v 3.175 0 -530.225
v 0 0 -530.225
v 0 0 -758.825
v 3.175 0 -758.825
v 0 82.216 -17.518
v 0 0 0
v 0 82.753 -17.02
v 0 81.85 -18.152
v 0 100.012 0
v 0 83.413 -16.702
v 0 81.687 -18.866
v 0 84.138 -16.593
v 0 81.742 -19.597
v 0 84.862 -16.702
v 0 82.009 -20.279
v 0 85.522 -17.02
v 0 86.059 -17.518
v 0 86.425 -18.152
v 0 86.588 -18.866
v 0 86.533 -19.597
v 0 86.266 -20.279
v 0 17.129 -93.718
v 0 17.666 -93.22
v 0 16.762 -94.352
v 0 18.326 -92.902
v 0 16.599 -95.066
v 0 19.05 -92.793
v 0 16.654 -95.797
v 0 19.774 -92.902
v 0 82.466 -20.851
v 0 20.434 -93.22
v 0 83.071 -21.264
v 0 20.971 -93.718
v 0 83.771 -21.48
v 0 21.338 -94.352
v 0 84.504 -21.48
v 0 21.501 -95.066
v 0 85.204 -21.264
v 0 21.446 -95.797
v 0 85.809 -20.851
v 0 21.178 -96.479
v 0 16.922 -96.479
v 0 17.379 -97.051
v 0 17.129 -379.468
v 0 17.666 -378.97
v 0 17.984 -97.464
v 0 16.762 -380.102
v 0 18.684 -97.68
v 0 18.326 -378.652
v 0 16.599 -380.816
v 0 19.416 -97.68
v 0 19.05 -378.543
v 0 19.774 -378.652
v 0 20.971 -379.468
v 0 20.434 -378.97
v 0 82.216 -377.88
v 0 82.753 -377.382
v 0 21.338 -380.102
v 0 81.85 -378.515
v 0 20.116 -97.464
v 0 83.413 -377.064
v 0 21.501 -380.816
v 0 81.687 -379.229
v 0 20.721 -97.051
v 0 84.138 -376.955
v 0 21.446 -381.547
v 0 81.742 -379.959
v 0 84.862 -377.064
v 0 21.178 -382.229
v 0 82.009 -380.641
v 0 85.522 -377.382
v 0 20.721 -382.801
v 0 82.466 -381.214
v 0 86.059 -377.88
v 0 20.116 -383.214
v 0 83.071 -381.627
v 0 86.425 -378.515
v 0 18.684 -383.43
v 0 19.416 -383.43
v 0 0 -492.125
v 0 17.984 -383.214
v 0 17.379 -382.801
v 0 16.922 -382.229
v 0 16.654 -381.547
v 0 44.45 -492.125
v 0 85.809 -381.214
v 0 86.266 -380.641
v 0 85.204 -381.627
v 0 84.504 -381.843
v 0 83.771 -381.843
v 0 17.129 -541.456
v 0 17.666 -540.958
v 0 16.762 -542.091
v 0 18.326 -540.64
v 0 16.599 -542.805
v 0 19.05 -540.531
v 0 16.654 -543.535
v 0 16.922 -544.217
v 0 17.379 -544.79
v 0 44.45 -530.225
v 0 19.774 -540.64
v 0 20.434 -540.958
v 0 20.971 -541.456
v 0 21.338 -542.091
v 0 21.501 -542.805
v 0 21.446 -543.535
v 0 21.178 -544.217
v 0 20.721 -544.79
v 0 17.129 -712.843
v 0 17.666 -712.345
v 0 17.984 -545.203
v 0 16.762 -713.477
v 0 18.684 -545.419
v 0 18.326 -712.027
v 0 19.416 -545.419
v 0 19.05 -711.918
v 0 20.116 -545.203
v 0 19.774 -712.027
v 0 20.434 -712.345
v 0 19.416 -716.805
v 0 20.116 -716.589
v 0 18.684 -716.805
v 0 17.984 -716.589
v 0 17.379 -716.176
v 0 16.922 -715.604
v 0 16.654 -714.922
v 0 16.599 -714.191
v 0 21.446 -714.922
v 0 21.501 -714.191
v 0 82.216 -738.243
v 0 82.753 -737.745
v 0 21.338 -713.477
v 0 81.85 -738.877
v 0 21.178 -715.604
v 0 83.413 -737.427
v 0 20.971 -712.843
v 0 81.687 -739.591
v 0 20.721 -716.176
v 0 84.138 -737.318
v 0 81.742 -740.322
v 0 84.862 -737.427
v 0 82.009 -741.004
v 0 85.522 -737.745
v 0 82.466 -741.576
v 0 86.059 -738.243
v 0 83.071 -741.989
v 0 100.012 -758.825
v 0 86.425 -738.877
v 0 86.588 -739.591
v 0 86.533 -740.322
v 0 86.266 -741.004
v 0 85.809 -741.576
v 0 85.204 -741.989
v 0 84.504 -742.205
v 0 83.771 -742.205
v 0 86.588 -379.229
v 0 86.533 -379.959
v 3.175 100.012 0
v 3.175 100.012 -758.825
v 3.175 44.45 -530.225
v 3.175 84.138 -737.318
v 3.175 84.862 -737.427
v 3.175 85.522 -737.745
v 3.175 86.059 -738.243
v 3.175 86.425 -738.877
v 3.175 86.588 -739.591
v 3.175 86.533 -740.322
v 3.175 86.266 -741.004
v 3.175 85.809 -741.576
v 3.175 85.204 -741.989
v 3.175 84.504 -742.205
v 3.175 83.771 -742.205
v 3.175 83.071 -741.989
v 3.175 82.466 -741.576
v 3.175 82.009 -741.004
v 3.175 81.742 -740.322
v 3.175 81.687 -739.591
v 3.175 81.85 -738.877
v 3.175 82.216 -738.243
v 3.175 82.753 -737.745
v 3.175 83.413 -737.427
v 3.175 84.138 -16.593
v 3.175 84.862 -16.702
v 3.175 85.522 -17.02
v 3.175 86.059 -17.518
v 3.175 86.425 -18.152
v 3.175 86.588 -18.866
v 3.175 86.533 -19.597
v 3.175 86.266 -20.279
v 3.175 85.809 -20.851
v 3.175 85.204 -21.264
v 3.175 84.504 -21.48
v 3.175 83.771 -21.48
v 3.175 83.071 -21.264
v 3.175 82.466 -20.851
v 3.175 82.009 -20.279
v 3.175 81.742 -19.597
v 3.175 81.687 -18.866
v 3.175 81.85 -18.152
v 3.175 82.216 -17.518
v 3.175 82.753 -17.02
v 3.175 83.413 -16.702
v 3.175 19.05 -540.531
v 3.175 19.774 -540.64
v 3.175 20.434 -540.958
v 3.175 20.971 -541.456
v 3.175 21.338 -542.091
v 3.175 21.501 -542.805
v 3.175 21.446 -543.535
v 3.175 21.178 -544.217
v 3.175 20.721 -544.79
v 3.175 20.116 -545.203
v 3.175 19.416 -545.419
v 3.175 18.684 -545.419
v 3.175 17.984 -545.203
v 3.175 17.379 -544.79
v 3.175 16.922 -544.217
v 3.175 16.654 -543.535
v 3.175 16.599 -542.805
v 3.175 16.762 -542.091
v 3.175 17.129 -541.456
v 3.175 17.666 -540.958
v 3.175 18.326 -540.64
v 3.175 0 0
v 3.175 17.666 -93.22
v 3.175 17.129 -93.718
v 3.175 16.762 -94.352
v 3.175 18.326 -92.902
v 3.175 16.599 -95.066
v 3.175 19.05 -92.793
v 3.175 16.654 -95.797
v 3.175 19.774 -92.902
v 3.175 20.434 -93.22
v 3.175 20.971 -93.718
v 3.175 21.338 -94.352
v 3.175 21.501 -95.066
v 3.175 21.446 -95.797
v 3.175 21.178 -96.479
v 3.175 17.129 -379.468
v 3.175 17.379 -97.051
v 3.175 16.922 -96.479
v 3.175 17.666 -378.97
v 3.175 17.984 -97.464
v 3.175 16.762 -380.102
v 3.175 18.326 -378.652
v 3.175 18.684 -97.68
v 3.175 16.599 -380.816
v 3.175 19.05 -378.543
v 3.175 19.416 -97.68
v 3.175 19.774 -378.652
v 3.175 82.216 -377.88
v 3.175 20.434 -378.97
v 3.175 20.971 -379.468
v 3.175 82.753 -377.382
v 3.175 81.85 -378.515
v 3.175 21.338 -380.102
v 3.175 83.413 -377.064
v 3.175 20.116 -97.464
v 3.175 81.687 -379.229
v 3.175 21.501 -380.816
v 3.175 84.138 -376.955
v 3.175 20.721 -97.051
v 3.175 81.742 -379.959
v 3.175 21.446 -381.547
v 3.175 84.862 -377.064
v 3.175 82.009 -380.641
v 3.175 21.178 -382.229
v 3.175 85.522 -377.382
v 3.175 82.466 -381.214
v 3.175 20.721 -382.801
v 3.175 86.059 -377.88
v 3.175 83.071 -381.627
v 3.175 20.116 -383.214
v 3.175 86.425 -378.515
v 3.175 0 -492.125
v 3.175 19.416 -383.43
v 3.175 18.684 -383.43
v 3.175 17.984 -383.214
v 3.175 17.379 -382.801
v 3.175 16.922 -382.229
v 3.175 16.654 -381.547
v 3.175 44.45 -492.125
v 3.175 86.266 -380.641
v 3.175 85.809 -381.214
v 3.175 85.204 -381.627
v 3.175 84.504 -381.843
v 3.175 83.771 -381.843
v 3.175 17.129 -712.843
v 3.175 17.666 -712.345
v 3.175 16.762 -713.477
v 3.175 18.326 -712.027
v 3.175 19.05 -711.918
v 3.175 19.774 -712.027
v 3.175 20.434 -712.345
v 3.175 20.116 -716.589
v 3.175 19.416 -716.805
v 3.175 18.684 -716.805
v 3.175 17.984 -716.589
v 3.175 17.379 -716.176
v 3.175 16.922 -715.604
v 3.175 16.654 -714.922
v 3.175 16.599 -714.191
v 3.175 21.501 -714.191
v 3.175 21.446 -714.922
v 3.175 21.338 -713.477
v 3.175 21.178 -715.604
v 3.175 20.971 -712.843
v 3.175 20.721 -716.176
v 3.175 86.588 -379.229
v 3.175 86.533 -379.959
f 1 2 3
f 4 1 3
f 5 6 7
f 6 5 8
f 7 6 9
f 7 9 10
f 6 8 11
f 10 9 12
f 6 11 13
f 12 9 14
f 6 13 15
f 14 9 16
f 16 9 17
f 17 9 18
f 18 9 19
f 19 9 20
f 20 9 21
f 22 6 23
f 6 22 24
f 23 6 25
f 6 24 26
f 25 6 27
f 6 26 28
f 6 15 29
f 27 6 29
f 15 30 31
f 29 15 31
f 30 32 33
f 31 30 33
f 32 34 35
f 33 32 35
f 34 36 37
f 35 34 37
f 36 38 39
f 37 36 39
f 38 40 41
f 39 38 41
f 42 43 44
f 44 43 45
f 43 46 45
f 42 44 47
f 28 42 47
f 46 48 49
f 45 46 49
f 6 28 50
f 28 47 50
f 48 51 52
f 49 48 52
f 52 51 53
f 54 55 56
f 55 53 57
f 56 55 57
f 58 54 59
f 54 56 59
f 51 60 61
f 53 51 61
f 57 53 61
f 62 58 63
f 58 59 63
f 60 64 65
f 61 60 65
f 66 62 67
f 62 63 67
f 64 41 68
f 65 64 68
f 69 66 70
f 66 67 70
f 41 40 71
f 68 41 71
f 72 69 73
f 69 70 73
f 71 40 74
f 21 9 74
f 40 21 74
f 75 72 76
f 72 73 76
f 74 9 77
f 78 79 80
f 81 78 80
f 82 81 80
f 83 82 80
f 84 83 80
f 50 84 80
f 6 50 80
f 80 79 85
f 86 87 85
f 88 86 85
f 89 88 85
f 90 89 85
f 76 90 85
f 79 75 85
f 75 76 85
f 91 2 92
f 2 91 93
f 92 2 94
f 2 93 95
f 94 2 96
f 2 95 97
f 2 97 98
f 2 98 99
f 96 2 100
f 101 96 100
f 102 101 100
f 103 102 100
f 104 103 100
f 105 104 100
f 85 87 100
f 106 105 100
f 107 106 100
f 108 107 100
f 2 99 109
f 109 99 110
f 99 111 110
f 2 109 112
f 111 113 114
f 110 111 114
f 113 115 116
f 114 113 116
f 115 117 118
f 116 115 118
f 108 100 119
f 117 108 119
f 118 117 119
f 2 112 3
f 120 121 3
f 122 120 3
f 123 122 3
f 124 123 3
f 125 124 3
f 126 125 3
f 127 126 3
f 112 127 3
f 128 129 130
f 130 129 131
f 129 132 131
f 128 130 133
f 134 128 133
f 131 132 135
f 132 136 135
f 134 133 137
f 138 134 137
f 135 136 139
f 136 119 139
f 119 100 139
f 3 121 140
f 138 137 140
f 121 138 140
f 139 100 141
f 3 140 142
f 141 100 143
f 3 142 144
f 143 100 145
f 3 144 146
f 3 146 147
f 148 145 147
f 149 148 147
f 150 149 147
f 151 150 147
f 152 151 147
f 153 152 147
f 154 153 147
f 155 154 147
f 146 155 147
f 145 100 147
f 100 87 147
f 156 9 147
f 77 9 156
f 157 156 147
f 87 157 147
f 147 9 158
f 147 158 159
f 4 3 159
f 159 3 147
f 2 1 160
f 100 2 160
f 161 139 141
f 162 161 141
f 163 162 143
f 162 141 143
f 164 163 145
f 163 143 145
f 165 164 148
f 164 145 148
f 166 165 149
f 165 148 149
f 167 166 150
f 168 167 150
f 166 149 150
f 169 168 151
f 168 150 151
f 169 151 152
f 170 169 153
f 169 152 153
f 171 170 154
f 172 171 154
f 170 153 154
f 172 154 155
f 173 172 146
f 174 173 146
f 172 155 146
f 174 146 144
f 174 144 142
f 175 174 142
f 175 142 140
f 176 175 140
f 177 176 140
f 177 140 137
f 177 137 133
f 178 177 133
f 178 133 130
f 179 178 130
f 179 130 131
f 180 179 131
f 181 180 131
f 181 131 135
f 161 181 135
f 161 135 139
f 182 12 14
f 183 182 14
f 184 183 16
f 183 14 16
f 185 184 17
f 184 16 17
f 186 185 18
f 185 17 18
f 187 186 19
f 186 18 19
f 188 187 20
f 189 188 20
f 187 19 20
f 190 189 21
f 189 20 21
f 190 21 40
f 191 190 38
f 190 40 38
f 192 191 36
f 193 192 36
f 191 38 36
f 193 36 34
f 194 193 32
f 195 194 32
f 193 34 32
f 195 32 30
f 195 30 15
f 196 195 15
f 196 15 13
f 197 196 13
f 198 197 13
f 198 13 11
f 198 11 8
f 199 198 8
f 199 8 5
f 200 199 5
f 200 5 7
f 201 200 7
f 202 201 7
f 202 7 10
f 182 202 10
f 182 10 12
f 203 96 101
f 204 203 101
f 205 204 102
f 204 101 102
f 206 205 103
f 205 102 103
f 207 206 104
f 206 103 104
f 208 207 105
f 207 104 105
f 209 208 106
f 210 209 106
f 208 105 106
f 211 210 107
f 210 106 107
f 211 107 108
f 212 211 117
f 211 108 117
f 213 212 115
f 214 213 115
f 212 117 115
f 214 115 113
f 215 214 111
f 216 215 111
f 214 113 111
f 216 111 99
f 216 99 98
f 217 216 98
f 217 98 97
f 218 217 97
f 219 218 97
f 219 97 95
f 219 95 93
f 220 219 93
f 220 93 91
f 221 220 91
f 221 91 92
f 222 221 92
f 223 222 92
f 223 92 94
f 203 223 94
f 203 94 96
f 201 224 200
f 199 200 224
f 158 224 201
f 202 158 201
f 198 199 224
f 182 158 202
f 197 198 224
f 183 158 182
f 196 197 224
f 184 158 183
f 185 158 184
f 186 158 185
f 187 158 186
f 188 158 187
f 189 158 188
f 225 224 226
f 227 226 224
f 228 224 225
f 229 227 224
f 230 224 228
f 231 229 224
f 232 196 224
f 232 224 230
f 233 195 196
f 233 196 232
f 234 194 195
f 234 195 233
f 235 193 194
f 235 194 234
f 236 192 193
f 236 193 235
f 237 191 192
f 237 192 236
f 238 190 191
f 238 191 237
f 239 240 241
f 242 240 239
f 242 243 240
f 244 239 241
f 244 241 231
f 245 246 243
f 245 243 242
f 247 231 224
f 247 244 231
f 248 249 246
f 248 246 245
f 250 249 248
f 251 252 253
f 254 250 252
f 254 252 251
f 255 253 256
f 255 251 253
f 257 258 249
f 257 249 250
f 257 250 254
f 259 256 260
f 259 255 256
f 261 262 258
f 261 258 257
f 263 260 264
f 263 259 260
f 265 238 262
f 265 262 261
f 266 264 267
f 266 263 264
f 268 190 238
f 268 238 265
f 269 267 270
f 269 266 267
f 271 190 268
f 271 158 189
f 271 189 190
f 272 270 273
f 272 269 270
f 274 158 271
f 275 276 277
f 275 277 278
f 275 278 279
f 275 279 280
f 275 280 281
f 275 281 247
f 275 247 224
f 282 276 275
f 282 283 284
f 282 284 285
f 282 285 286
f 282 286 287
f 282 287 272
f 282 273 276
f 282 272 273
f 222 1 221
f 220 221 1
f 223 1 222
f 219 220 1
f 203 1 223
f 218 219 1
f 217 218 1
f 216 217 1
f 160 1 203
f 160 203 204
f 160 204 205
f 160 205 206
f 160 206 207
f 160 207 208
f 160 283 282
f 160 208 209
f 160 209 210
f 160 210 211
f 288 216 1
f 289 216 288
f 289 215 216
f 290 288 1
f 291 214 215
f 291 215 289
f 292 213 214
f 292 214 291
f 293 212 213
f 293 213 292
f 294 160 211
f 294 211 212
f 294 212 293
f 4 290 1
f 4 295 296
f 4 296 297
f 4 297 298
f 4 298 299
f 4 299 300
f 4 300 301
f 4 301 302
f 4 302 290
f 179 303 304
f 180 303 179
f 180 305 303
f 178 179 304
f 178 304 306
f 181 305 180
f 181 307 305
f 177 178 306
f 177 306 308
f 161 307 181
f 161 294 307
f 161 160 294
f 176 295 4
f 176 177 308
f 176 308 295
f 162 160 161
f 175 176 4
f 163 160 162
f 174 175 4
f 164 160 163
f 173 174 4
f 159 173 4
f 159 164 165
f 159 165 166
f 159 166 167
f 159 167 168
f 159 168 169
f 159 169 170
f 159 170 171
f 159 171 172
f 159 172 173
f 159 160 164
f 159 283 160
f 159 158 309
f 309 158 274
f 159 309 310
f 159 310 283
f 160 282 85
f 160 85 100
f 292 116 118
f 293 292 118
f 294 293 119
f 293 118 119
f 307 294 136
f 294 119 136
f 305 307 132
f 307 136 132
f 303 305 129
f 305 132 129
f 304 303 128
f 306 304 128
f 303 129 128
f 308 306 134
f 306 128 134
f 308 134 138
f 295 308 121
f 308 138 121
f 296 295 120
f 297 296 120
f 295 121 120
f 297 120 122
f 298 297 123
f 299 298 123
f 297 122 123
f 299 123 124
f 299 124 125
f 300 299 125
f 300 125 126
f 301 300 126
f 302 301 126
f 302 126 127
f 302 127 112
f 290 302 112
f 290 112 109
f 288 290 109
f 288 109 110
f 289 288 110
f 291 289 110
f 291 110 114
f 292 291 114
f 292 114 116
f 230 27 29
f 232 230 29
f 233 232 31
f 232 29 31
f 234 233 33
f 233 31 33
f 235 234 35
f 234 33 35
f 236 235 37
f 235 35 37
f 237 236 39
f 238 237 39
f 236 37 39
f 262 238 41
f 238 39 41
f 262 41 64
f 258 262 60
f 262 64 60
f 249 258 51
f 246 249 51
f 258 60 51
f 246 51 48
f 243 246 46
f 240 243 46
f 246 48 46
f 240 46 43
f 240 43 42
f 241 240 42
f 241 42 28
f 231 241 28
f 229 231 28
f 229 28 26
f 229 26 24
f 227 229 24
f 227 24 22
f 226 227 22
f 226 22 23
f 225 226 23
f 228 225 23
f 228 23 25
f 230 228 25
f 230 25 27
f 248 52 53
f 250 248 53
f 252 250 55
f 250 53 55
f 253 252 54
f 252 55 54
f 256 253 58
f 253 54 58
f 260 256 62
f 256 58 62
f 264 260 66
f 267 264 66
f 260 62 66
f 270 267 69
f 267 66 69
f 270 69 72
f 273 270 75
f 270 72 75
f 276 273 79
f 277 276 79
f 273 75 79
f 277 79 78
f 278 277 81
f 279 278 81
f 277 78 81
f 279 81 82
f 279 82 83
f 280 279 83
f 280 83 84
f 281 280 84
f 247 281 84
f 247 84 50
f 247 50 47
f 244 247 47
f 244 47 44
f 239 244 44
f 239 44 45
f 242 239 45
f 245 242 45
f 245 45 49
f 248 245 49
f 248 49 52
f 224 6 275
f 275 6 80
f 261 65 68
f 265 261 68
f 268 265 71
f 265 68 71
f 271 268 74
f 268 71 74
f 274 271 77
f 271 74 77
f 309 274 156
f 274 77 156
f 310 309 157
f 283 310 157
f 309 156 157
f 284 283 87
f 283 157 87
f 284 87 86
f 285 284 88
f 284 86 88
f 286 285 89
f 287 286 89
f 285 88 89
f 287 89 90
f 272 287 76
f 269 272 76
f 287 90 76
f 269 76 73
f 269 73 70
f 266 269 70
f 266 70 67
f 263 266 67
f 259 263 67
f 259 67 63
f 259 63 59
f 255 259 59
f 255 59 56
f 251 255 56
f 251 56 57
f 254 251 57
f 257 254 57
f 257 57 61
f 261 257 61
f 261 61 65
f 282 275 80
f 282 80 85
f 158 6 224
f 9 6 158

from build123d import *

# Parameters (mm, degrees)
SKETCH2_W                    = 758.825
SKETCH2_H                    = 100.0125
BOSS_EXTRUDE1_DEPTH          = 3.175
F_10_0_1935_DIAMETER_HOLE2_D = 4.9149
SKETCH7_W                    = 38.1
SKETCH7_H                    = 44.45
CUT_EXTRUDE3_DEPTH           = 254


with BuildPart() as part:
    # Sketch2 → Boss-Extrude1 (new body)
    with BuildSketch(Plane(origin=(0, 0, 0), x_dir=(0, 0, -1), z_dir=(1, 0, 0))):
        with Locations((379.4125, 50.00625)):
            Rectangle(SKETCH2_W, SKETCH2_H)
    extrude(amount=BOSS_EXTRUDE1_DEPTH)

    # #10 (0.1935) Diameter Hole2 (through all)
    with Locations(Plane(origin=(3.175, 0, 0), x_dir=(0, 0, -1), z_dir=(1, 0, 0))):
        with Locations((19.05, 84.1375), (379.4125, 84.1375), (739.775, 84.1375), (95.25, 19.05), (381, 19.05), (542.9885, 19.05), (714.375, 19.05)):
            Hole(F_10_0_1935_DIAMETER_HOLE2_D / 2)

    # Sketch7 → Cut-Extrude3 (cut)
    with BuildSketch(Plane(origin=(3.175, 0, 0), x_dir=(0, 0, -1), z_dir=(1, 0, 0))):
        with Locations((511.175, 22.225)):
            Rectangle(SKETCH7_W, SKETCH7_H)
    extrude(amount=-CUT_EXTRUDE3_DEPTH, mode=Mode.SUBTRACT)


solid = part.part
